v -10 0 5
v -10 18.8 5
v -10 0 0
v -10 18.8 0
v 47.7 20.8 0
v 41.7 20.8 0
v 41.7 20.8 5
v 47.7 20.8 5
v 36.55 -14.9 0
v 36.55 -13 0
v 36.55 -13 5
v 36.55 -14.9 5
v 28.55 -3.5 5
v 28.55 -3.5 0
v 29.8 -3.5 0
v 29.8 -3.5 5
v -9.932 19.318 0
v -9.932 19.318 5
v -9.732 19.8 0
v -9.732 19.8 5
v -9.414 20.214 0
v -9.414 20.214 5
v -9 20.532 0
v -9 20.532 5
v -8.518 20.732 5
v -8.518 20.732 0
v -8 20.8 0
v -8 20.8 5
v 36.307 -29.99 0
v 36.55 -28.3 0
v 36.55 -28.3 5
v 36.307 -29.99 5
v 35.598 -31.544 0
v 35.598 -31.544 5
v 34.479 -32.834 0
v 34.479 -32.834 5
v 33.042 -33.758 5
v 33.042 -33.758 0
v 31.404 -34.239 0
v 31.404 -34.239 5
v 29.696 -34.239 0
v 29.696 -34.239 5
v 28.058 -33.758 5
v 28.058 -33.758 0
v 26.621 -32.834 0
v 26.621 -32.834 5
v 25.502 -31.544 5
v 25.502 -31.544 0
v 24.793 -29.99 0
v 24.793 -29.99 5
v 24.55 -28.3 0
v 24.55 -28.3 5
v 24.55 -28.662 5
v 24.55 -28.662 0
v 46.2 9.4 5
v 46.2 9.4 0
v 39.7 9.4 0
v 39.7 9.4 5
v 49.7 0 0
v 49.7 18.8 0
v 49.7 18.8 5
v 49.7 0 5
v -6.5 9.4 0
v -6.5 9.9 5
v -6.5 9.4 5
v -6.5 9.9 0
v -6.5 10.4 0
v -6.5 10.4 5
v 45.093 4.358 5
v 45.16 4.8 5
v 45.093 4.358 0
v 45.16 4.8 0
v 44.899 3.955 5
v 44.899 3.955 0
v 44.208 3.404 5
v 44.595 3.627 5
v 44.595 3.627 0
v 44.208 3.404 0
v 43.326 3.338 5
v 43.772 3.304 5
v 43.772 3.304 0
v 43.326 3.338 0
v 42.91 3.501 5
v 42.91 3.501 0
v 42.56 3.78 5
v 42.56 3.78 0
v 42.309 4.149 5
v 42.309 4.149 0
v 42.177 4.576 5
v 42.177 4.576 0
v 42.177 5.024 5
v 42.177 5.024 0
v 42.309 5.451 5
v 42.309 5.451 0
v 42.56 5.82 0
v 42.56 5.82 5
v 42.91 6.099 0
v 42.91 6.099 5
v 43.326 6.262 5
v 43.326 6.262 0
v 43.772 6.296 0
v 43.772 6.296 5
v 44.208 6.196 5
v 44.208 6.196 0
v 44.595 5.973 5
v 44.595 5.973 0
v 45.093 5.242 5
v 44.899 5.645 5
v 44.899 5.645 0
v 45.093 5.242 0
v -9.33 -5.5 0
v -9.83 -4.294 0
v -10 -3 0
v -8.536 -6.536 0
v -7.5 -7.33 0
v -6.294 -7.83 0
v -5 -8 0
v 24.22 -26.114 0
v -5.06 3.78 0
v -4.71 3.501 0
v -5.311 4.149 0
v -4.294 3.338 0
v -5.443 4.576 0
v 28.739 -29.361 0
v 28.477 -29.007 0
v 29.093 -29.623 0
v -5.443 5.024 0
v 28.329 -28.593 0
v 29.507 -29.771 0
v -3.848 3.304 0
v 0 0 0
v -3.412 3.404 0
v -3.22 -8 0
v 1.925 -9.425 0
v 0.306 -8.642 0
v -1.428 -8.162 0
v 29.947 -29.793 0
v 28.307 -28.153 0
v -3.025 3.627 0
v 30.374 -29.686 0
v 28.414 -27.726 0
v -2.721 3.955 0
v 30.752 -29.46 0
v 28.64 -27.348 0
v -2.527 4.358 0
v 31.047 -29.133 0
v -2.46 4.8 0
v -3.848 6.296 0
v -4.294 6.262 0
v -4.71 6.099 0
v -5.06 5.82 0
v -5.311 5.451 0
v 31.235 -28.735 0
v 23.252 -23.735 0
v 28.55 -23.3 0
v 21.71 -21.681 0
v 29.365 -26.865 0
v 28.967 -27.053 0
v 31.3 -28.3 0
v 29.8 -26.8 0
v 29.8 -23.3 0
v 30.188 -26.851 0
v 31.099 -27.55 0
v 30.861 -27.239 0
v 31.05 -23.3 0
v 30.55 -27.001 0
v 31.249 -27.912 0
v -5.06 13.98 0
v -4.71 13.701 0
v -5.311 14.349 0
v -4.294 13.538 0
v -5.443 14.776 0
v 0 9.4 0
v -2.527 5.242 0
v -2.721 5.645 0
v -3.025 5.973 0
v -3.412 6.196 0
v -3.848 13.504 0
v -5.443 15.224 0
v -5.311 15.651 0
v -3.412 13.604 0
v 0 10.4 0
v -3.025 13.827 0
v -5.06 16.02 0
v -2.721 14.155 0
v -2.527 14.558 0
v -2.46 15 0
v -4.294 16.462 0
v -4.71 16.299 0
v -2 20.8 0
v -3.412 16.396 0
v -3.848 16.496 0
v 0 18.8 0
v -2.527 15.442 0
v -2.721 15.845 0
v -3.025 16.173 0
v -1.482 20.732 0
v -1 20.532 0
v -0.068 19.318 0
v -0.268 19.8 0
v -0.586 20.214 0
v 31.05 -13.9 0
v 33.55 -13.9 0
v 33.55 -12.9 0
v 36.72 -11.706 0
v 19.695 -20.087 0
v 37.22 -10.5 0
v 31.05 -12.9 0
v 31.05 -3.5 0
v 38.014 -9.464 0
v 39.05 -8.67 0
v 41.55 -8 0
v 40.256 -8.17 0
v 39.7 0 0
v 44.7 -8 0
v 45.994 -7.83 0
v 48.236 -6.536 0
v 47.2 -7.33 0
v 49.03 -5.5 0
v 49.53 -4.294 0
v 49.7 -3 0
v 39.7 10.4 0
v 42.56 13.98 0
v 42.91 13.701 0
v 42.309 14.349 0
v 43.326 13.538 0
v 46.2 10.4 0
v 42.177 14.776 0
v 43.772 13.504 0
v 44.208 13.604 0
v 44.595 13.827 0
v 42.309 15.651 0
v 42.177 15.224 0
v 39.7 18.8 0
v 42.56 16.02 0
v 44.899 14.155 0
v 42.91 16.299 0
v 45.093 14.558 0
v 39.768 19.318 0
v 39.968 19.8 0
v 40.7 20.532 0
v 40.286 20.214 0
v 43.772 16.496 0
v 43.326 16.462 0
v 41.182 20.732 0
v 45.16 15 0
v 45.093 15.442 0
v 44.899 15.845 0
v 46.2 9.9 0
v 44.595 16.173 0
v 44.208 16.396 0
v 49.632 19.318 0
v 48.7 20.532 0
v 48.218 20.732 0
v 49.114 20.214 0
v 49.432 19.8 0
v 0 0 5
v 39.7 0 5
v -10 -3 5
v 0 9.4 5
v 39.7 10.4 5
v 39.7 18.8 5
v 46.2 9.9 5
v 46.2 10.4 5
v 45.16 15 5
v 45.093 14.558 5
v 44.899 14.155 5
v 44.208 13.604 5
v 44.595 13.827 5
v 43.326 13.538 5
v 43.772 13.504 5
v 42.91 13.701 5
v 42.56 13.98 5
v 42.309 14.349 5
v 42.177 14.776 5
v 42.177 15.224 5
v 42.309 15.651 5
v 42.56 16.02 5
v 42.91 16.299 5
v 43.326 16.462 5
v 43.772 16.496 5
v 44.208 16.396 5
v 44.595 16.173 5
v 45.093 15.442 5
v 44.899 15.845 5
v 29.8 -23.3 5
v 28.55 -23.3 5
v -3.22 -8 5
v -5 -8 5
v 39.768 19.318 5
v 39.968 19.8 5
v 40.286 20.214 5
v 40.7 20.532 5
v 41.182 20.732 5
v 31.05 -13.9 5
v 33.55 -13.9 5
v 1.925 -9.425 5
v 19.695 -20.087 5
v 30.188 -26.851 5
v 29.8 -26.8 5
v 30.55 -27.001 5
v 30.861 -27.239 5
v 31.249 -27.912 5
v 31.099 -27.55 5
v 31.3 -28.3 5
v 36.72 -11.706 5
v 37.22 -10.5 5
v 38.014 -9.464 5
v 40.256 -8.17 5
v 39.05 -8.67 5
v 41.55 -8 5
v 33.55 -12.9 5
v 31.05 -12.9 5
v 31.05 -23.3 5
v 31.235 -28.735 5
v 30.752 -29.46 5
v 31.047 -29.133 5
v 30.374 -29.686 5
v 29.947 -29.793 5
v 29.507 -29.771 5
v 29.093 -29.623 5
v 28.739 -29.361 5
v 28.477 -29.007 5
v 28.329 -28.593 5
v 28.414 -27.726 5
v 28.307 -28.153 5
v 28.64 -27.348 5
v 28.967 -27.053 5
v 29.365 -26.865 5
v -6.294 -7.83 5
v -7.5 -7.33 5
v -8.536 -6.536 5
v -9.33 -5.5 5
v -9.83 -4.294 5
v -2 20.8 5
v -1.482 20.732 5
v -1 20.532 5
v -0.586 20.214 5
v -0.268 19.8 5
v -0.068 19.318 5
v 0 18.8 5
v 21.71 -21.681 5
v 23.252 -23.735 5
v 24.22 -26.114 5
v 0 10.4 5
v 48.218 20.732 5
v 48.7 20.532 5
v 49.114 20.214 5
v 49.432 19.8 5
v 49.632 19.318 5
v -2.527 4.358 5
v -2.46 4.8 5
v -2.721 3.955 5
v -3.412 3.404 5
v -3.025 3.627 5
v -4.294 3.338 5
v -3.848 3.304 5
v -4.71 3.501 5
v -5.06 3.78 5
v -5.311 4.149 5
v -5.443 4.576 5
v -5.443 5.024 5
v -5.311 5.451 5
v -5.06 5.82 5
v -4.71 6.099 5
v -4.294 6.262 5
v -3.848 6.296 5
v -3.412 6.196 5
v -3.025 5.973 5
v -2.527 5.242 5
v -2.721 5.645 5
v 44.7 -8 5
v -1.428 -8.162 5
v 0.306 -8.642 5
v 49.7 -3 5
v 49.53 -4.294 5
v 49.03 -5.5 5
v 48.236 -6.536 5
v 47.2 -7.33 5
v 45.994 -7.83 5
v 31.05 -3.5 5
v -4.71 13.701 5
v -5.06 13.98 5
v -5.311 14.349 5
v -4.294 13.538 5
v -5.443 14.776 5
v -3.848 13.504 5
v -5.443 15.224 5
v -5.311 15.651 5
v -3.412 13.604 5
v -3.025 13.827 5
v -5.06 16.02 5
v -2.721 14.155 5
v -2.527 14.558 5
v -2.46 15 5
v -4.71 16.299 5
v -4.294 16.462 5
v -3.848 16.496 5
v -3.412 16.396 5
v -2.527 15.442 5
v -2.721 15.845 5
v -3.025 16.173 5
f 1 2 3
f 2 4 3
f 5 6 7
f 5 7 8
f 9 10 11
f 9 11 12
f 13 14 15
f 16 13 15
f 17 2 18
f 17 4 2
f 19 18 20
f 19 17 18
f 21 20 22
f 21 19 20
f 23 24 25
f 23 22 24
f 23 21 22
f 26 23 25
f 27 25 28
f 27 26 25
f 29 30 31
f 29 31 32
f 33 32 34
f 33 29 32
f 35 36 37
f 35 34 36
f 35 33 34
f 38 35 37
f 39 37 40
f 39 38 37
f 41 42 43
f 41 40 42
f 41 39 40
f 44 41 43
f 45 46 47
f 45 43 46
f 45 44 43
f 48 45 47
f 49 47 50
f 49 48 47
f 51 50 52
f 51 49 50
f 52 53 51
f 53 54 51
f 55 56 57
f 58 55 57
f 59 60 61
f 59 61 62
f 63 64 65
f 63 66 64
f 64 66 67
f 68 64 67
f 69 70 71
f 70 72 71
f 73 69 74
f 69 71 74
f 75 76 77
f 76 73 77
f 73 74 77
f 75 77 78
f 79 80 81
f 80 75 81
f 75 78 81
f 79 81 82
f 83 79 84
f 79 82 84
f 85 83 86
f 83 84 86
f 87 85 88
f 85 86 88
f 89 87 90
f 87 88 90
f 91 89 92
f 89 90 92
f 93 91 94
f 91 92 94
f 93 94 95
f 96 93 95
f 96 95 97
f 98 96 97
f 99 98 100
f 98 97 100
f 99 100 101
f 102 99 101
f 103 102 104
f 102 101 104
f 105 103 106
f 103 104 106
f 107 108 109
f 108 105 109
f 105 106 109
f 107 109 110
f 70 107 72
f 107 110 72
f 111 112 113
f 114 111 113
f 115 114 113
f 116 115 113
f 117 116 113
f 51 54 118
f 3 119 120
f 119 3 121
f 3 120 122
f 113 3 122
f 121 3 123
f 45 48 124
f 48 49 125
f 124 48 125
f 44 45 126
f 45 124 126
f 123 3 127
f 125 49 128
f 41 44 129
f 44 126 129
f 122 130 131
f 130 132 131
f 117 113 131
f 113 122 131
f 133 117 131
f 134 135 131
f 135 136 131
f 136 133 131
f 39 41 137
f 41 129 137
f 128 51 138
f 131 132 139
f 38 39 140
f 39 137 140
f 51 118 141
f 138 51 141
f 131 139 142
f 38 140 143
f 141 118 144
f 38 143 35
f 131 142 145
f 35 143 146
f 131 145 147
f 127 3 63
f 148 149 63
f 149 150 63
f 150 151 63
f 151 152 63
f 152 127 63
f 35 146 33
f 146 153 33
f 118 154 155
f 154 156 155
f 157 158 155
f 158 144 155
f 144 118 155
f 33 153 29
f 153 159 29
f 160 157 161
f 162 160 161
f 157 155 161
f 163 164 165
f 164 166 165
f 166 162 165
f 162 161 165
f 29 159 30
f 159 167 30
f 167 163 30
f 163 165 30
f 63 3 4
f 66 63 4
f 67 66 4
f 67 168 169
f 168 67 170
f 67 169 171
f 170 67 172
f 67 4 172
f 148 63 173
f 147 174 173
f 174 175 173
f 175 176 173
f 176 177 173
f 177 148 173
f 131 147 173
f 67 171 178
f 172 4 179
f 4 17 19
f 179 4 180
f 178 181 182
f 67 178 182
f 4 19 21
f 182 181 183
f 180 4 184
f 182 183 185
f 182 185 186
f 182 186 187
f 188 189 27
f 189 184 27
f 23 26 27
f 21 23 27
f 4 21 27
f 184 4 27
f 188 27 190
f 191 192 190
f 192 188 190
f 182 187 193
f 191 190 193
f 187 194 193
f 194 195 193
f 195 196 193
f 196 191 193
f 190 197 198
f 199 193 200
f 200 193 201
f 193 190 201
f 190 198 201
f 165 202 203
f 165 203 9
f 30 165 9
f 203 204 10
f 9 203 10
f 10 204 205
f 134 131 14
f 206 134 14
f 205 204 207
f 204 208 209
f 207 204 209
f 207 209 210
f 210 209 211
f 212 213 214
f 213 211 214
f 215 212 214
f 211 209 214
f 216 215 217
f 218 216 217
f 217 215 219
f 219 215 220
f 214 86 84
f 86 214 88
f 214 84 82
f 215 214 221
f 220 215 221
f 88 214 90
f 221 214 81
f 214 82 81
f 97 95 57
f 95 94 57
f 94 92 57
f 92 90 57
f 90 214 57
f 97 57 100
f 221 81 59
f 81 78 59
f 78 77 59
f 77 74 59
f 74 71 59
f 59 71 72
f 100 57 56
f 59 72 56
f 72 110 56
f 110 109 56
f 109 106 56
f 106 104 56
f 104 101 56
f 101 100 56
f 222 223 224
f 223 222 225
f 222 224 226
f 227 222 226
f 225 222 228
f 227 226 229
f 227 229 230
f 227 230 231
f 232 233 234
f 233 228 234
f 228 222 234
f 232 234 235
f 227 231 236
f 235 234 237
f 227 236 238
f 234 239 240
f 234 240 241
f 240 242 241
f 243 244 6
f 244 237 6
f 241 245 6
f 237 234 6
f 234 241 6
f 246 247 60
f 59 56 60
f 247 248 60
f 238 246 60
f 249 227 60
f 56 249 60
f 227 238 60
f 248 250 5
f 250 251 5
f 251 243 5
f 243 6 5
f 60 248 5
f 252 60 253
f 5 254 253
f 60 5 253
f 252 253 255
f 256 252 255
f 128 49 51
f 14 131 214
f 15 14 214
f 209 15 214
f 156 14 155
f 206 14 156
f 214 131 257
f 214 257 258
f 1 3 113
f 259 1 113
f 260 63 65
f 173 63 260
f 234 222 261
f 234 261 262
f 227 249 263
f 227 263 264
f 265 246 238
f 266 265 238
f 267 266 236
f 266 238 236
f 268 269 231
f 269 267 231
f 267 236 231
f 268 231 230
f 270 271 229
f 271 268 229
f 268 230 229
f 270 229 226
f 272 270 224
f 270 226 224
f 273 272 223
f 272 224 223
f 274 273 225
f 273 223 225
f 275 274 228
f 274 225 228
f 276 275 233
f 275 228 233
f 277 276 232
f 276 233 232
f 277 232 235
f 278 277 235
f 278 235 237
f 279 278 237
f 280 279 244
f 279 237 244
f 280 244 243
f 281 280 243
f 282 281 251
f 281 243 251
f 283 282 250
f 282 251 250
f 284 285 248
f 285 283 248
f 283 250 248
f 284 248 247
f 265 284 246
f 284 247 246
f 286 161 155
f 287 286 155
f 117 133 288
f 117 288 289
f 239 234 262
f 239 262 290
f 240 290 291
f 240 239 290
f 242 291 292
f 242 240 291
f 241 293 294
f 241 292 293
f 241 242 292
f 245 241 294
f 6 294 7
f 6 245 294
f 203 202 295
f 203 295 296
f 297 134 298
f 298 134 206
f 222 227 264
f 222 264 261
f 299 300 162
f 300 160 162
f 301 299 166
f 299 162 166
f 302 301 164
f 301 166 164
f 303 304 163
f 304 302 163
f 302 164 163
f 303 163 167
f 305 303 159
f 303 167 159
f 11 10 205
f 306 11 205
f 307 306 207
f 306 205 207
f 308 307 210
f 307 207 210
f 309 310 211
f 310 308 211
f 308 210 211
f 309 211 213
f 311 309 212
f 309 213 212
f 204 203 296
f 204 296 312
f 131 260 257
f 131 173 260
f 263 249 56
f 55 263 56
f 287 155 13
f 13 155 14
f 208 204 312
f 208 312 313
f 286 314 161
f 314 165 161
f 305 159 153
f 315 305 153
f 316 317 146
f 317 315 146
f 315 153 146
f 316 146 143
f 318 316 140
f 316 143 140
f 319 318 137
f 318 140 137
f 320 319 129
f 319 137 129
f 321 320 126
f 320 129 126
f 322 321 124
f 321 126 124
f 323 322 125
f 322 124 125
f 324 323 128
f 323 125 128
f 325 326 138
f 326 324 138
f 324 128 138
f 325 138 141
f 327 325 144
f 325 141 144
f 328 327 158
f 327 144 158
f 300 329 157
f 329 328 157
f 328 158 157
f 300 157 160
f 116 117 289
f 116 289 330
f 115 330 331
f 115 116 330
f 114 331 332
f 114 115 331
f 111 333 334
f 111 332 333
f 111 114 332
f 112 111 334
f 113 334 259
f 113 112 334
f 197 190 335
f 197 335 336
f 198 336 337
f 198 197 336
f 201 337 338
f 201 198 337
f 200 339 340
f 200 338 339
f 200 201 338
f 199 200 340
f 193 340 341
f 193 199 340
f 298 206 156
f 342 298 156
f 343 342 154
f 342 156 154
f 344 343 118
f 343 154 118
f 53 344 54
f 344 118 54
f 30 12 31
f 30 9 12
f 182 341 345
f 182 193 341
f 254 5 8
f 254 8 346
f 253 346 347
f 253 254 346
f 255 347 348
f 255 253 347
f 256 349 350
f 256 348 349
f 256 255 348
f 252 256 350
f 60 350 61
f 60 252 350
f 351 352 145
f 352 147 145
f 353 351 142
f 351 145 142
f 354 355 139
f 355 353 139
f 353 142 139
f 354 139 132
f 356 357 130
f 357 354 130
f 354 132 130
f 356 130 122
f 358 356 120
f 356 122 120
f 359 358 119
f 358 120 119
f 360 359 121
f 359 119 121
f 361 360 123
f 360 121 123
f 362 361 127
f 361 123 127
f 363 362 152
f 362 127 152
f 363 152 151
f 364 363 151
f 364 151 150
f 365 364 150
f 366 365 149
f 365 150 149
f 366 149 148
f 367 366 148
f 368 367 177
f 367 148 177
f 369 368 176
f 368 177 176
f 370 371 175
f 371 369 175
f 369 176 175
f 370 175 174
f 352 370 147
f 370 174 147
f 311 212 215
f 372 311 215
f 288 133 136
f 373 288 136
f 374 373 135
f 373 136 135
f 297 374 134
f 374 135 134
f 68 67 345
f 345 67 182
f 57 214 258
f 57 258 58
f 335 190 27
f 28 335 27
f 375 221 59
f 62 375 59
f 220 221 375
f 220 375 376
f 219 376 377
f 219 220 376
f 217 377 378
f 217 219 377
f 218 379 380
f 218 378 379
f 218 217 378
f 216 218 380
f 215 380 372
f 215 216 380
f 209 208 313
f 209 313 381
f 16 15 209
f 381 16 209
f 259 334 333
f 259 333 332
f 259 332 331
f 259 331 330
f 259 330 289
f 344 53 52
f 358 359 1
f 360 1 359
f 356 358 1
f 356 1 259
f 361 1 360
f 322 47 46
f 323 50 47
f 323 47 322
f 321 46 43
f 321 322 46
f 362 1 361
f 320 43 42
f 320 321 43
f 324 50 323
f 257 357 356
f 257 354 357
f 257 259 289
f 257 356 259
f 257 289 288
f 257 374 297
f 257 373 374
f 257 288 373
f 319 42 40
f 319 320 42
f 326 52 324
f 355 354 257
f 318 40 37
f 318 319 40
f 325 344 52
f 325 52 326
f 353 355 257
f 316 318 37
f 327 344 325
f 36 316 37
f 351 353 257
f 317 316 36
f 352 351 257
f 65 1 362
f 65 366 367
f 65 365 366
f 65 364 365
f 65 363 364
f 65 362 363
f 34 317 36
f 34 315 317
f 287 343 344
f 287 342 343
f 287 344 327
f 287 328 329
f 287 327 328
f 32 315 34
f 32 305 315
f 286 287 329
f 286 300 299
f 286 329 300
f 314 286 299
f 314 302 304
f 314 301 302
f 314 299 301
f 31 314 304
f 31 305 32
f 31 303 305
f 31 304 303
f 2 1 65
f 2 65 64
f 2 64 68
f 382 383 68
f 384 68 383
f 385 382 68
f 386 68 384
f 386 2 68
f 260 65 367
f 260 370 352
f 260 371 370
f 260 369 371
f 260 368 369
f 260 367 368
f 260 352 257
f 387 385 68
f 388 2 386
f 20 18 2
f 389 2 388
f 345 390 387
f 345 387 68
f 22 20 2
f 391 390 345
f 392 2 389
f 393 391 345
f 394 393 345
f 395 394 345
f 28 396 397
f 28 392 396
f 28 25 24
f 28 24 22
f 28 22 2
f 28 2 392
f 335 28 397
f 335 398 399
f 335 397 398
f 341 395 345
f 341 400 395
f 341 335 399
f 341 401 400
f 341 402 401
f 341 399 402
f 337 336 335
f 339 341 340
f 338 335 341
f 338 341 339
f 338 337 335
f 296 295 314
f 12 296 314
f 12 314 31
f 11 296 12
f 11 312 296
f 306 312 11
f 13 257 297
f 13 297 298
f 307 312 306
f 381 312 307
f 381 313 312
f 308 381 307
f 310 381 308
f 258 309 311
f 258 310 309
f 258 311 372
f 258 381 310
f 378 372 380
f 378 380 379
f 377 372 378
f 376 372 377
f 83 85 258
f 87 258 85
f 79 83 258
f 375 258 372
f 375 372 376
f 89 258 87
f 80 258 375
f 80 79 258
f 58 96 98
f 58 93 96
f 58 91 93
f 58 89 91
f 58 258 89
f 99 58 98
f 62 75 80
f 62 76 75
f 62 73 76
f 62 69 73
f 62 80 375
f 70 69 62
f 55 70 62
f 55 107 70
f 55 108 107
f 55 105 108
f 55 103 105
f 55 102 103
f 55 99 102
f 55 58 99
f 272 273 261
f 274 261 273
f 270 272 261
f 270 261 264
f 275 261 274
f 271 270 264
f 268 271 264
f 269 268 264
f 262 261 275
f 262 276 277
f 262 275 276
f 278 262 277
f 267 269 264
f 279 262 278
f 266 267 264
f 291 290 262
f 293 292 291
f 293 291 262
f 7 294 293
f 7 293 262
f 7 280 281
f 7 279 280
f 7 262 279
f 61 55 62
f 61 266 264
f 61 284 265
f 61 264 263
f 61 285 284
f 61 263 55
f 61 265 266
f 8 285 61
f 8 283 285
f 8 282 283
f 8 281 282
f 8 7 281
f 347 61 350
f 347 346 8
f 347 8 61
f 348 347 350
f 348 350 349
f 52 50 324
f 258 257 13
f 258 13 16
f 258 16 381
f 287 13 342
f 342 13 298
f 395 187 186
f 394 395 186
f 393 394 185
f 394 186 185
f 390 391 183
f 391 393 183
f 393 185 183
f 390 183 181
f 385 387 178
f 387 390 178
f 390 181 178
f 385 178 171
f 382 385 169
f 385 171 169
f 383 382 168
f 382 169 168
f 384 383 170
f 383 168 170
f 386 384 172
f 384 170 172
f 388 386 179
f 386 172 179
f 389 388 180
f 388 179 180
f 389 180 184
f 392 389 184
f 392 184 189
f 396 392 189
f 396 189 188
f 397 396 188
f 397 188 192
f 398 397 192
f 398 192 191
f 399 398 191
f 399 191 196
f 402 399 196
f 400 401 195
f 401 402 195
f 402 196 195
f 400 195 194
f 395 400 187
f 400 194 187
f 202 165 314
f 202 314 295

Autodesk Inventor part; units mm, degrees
ref_plane "YZ Plane" through (0, 0, 0) normal (1, 0, 0) x (0, 1, 0)
ref_plane "XZ Plane" through (0, 0, 0) normal (0, 1, 0) x (-1, 0, 0)
ref_plane "XY Plane" through (0, 0, 0) normal (0, 0, 1) x (1, 0, 0)
sketch "Sketch1" plane through (0, 0, 0) normal (0, 0, 1) x (1, 0, 0)
  line L0 (0, 0) -> (39.7, 0)
  circle A0 centre (43.66, 15) radius 1.5
  circle A1 centre (43.66, 4.8) radius 1.5
  circle A2 centre (-3.96, 15) radius 1.5
  circle A3 centre (-3.96, 4.8) radius 1.5
  line L1 (46.2, 9.9) -> (46.2, 10.4)
  line L2 (46.2, 10.4) -> (39.7, 10.4)
  line L3 (46.2, 9.9) -> (46.2, 9.4)
  line L4 (46.2, 9.4) -> (39.7, 9.4)
  line L5 (39.7, 0) -> (39.7, 9.4)
  line L6 (39.7, 10.4) -> (39.7, 18.8)
  line L7 (-6.5, 9.9) -> (-6.5, 10.4)
  line L8 (-6.5, 10.4) -> (0, 10.4)
  line L9 (-6.5, 9.4) -> (0, 9.4)
  line L10 (-6.5, 9.9) -> (-6.5, 9.4)
  line L11 (0, 9.4) -> (0, 0)
  line L12 (29.8, -3.5) -> (31.05, -3.5)
  line L13 (31.05, -23.3) -> (28.55, -23.3)
  line L14 (28.55, -23.3) -> (28.55, -3.5)
  line L15 (28.55, -3.5) -> (29.8, -3.5)
  line L16 (29.8, -23.3) -> (29.8, -28.3)
  circle A4 centre (29.8, -28.3) radius 1.5
  line L17 (31.05, -23.3) -> (31.05, -13.9)
  line L18 (31.05, -13.9) -> (33.55, -13.9)
  line L19 (33.55, -13.9) -> (33.55, -12.9)
  line L20 (33.55, -12.9) -> (31.05, -12.9)
  line L21 (31.05, -12.9) -> (31.05, -3.5)
  line L22 (36.55, -14.9) -> (36.55, -28.3)
  line L23 (-10, 0) -> (-10, -3)
  line L24 (36.55, -13) -> (36.55, -14.9)
  line L25 (41.55, -8) -> (44.7, -8)
  line L26 (49.7, -3) -> (49.7, 0)
  arc A5 (24.55, -28.3) -> (36.55, -28.3) centre (30.55, -28.3) ccw
  arc A6 (44.7, -8) -> (49.7, -3) centre (44.7, -3) ccw
  arc A7 (-10, -3) -> (-5, -8) centre (-5, -3) ccw
  arc A8 (41.55, -8) -> (36.55, -13) centre (41.55, -13) ccw
  line L27 (24.55, -28.6619) -> (24.55, -28.3)
  line L28 (-3.2198, -8) -> (-5, -8)
  line L29 (1.9251, -9.4251) -> (19.695, -20.087)
  arc A9 (1.9251, -9.4251) -> (-3.2198, -8) centre (-3.2198, -18) ccw
  arc A10 (24.55, -28.6619) -> (19.695, -20.087) centre (14.55, -28.6619) ccw
  line L30 (-2, 20.8) -> (-8, 20.8)
  line L31 (-10, 18.8) -> (-10, 0)
  line L32 (41.7, 20.8) -> (47.7, 20.8)
  line L33 (49.7, 18.8) -> (49.7, 0)
  arc A11 (0, 18.8) -> (-2, 20.8) centre (-2, 18.8) ccw
  arc A12 (-8, 20.8) -> (-10, 18.8) centre (-8, 18.8) ccw
  arc A13 (41.7, 20.8) -> (39.7, 18.8) centre (41.7, 18.8) ccw
  arc A14 (49.7, 18.8) -> (47.7, 20.8) centre (47.7, 18.8) ccw
  line L34 (0, 18.8) -> (0, 10.4)
  point P0 (0, 20.8)
  point P1 (-10, 20.8)
  dimension "d13" = 1.25
  dimension "d15" = 2.5
  dimension "d16" = 19.8
  dimension "d17" = 5
  dimension "d25" = 9.4
  dimension "d26" = 2.5
  dimension "d27" = 1
  dimension "d28" = 1
  dimension "d29" = 1
  dimension "d30" = 6.5
  dimension "d48" = 5
  dimension "d54" = 10
  dimension "d57" = 10
  dimension "d58" = 2
extrude "Extrusion1" add sketch "Sketch1" along normal blind 5
properties part number "braket atas 2"
